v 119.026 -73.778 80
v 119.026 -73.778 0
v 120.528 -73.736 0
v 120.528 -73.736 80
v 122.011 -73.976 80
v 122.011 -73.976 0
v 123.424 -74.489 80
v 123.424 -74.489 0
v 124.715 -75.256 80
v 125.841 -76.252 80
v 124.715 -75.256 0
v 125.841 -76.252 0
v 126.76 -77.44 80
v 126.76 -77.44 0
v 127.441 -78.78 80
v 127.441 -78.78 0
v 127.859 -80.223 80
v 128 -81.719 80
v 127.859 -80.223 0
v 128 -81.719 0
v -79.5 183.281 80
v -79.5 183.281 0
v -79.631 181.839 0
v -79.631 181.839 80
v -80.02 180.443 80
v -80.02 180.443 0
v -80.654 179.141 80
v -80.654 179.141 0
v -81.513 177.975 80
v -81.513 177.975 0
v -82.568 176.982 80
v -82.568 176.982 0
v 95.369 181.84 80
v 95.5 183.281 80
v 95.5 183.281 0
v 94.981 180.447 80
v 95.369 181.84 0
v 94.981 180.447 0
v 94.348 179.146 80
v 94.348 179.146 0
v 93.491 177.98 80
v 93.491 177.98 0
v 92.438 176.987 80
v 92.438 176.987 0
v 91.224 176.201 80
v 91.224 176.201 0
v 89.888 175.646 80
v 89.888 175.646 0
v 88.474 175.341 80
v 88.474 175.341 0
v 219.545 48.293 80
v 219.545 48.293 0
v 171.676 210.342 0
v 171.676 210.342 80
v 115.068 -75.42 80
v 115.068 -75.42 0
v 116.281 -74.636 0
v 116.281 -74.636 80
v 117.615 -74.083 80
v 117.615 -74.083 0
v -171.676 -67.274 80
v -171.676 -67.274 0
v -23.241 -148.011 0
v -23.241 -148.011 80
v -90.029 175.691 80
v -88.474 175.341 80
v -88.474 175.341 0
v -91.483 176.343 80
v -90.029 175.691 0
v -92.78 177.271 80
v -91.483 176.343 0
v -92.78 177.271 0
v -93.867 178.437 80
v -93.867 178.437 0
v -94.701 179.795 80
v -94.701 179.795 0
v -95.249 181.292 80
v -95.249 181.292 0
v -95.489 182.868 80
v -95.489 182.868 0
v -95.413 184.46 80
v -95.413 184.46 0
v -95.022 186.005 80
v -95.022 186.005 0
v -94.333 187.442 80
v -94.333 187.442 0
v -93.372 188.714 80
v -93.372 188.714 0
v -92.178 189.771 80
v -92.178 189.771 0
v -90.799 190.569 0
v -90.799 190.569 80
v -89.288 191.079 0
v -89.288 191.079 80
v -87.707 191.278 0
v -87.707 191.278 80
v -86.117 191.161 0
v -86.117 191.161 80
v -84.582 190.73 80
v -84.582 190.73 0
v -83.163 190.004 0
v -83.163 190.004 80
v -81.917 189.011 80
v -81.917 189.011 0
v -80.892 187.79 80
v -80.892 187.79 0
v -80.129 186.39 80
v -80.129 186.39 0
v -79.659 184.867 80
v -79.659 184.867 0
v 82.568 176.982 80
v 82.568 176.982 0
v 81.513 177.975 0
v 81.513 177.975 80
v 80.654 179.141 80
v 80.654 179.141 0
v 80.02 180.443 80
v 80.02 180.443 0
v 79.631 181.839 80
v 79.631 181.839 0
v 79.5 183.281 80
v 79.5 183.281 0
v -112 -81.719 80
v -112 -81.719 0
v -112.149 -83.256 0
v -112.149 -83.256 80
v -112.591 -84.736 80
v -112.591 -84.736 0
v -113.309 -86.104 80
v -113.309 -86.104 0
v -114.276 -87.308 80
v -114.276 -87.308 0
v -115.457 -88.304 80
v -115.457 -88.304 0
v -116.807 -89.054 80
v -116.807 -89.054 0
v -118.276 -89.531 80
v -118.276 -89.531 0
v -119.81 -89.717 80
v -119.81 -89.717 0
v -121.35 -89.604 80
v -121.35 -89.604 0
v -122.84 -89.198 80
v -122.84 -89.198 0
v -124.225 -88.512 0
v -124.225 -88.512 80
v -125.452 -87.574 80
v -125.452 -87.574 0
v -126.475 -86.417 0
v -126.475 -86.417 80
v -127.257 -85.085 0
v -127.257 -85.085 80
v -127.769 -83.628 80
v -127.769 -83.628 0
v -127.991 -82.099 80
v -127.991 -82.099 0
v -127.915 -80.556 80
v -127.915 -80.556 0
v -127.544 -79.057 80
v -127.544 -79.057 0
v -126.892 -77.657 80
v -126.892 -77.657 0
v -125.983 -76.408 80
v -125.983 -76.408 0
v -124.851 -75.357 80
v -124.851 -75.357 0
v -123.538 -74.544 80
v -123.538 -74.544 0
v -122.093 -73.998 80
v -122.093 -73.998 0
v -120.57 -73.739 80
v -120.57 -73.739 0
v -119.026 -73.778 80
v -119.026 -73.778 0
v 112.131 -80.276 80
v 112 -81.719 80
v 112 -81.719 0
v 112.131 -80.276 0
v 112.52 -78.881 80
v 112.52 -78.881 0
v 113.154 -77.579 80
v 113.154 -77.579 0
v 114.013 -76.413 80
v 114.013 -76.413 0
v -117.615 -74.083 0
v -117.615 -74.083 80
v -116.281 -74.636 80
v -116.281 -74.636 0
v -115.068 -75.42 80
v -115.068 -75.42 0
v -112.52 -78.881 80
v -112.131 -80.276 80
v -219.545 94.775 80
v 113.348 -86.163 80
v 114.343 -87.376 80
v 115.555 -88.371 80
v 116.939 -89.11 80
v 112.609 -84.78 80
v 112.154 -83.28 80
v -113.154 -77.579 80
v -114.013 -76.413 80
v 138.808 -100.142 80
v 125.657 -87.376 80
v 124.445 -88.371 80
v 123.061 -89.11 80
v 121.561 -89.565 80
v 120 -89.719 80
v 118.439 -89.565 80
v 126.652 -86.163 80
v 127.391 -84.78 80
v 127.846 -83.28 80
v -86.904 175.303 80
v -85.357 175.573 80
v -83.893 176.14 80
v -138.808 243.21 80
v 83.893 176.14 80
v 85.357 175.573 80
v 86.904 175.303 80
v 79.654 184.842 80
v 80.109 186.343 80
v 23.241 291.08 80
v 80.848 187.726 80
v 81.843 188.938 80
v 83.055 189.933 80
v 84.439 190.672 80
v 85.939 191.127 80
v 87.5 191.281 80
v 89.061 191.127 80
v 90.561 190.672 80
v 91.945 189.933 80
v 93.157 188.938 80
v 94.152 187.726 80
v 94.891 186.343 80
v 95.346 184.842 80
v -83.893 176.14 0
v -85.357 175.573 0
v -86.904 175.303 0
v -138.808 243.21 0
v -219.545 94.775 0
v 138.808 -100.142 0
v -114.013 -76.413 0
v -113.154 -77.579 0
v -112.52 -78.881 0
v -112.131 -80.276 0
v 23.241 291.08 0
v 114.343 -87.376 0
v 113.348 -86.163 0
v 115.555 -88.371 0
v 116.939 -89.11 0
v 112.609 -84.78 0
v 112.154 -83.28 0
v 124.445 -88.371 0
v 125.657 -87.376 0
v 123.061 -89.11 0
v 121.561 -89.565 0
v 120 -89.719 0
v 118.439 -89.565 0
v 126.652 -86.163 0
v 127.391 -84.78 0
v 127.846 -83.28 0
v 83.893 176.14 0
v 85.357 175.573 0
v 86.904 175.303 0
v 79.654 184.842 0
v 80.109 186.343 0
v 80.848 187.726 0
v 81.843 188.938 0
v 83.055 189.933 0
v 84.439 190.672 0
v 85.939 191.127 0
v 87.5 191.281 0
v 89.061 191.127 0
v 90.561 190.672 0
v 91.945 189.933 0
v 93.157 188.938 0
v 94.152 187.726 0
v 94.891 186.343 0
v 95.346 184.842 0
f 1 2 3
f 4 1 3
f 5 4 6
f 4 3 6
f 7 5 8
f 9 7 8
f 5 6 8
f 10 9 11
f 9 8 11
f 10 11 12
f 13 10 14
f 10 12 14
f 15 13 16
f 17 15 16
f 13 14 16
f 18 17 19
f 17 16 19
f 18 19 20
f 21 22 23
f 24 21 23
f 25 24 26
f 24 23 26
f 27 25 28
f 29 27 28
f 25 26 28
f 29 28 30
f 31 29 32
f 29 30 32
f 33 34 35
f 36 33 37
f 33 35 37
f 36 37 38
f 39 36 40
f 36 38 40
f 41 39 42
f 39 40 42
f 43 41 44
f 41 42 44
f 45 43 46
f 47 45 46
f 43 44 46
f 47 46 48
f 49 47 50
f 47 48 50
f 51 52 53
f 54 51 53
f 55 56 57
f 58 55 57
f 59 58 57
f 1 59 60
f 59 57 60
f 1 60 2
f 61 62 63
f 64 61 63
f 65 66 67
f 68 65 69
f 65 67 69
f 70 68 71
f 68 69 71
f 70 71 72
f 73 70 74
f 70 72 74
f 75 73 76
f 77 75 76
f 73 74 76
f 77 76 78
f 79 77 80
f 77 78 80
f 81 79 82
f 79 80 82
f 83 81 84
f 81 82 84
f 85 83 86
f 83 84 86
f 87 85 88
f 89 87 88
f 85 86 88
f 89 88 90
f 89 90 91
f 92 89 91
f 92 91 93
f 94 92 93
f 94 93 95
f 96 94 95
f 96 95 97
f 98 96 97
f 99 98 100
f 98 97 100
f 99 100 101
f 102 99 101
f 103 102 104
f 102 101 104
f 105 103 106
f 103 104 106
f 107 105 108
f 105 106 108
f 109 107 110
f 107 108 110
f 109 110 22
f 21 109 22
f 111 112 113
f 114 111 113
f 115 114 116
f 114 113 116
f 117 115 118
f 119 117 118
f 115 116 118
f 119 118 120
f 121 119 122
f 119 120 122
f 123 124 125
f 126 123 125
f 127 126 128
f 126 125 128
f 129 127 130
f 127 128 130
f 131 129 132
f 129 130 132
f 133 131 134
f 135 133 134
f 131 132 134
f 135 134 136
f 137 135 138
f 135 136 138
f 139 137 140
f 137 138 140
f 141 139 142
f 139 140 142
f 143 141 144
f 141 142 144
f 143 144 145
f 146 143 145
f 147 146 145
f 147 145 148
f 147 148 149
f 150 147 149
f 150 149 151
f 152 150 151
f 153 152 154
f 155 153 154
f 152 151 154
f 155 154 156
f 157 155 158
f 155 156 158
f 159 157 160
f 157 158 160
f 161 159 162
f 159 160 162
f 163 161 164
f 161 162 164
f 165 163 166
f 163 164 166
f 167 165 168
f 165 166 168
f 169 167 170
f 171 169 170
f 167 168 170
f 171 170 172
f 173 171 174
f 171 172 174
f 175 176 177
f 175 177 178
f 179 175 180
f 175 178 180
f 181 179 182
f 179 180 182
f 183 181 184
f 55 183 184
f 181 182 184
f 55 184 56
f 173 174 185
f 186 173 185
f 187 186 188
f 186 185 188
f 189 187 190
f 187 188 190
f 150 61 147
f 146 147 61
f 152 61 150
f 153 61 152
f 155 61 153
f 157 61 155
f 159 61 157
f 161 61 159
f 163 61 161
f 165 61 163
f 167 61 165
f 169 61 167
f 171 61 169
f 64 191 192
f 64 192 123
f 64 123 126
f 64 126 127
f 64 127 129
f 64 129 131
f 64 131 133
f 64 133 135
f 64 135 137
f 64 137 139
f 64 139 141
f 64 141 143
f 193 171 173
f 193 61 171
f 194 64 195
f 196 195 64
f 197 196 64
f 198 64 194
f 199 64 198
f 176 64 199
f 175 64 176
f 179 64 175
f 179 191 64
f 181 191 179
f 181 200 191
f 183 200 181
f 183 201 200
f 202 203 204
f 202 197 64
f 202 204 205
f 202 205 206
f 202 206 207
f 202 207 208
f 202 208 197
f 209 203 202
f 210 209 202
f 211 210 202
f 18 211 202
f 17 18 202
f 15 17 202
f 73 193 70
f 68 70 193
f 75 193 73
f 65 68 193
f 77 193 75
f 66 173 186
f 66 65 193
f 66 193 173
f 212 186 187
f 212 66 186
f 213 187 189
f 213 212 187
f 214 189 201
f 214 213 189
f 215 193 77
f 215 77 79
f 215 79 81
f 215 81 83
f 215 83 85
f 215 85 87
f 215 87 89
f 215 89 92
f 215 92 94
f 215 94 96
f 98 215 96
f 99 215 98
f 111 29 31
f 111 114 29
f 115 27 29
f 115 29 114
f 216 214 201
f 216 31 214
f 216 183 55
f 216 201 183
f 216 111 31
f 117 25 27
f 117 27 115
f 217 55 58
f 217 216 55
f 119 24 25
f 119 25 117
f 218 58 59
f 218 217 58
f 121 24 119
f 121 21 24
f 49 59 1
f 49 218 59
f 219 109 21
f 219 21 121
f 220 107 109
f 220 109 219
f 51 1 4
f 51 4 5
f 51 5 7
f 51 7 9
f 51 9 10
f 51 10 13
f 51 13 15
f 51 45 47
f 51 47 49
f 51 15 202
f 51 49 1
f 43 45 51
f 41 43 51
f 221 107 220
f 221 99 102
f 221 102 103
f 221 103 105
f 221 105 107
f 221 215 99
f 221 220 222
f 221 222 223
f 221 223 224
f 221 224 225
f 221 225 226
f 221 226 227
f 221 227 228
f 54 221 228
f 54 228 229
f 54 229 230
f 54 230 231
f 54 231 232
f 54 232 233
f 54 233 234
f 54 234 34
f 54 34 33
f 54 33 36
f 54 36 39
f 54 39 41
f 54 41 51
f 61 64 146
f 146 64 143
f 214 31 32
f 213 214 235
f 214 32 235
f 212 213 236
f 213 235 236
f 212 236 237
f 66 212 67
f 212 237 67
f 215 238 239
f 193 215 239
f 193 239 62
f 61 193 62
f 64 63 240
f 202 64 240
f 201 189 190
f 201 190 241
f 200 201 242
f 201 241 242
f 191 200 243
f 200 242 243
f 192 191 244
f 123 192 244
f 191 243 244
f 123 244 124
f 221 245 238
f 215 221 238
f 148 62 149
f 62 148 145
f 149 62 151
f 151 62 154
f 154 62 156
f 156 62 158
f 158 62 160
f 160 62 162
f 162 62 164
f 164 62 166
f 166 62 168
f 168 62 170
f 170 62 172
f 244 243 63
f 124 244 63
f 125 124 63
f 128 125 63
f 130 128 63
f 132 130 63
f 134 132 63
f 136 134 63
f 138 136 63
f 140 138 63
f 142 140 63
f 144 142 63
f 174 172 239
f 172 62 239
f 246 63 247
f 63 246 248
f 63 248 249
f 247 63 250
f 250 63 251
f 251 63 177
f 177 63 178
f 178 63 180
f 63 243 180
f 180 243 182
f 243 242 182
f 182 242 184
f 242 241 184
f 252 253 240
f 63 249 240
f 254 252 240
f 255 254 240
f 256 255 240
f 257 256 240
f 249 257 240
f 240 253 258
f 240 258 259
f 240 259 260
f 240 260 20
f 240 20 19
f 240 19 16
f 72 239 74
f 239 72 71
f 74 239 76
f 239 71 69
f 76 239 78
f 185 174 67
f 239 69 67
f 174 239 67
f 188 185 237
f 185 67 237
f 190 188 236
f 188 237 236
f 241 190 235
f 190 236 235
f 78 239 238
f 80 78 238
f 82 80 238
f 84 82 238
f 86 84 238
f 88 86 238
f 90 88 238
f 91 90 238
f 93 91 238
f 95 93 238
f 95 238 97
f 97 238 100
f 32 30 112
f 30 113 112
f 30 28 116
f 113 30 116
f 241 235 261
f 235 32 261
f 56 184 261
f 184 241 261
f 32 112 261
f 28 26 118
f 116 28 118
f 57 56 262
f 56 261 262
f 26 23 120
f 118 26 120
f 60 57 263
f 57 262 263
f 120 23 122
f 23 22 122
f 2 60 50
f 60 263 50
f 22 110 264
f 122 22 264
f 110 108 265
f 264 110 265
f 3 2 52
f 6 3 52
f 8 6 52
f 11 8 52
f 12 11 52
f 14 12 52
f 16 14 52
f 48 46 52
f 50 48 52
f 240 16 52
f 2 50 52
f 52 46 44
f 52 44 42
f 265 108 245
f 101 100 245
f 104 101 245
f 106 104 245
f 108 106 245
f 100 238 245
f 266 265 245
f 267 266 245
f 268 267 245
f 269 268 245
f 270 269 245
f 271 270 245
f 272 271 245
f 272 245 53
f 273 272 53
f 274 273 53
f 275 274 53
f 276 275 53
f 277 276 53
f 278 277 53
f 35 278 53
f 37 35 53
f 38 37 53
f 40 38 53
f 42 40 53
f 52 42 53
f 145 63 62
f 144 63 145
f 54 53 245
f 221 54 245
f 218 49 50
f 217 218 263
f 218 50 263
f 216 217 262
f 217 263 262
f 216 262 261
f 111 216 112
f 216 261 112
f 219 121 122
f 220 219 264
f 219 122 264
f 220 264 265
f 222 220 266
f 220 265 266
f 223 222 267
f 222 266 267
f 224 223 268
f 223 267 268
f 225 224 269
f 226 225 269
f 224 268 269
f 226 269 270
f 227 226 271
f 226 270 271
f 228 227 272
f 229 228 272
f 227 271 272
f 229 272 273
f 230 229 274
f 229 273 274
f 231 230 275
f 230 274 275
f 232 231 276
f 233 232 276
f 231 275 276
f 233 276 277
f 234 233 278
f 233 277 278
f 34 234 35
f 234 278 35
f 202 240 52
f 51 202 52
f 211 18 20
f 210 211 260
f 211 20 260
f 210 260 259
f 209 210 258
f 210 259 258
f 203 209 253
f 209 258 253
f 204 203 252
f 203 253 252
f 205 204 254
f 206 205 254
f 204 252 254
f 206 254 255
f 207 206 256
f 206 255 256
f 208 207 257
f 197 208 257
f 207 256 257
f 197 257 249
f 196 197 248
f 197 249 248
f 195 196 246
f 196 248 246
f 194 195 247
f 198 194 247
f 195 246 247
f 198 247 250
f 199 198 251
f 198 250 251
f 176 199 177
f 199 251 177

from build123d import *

# Parameters (mm, degrees)
F1_DEPTH = 80


with BuildPart() as f1:
    # F0 (on Top) → F1 (new body)
    with BuildSketch(Plane.XY):
        Polygon((-138.8081118726, 243.2102153142), (-219.5454731322, 94.7753002802), (-171.6760737886, -67.273970347), (-23.2411587546, -148.0113316066), (138.8081118726, -100.141932263), (219.5454731322, 48.292982771), (171.6760737886, 210.3422533982), (23.2411587546, 291.0796146578), align=None)
        with BuildLine():
            Line((-79.5, 183.2811294774), (0, 183.2811294774))
            Line((0, 183.2811294774), (79.5, 183.2811294774))
            ThreePointArc((79.5, 183.2811294774), (87.5, 191.2811294774), (95.5, 183.2811294774))
            ThreePointArc((95.5, 183.2811294774), (93.4912722212, 177.9797469057), (88.473835707, 175.3406229435))
            Line((88.473835707, 175.3406229435), (119.026164293, -73.7783639886))
            ThreePointArc((119.026164293, -73.7783639886), (125.3013825717, -75.7275983014), (128, -81.7188705226))
            ThreePointArc((128, -81.7188705226), (120, -89.7188705226), (112, -81.7188705226))
            Line((112, -81.7188705226), (0, -81.7188705226))
            Line((0, -81.7188705226), (-112, -81.7188705226))
            ThreePointArc((-112, -81.7188705226), (-125.9912722212, -87.0202530943), (-119.026164293, -73.7783639886))
            Line((-119.026164293, -73.7783639886), (-88.473835707, 175.3406229435))
            ThreePointArc((-88.473835707, 175.3406229435), (-92.8013825717, 189.2724016986), (-79.5, 183.2811294774))
        make_face(mode=Mode.SUBTRACT)
        with BuildLine():
            Line((82.567931818, 176.9823436064), (0, 71.5341415256))
            Line((0, 71.5341415256), (115.067931818, -75.4200846516))
            ThreePointArc((115.067931818, -75.4200846516), (116.9350796307, -74.3292654499), (119.026164293, -73.7783639886))
            Line((119.026164293, -73.7783639886), (88.473835707, 175.3406229435))
            ThreePointArc((88.473835707, 175.3406229435), (85.3574051327, 175.5733874452), (82.567931818, 176.9823436064))
        make_face()
        with BuildLine():
            Line((115.067931818, -75.4200846516), (0, 71.5341415256))
            Line((0, 71.5341415256), (0, -81.7188705226))
            Line((0, -81.7188705226), (112, -81.7188705226))
            ThreePointArc((112, -81.7188705226), (112.8077630234, -78.2157680017), (115.067931818, -75.4200846516))
        make_face()
        with BuildLine():
            Line((0, -81.7188705226), (0, 71.5341415256))
            Line((0, 71.5341415256), (-115.067931818, -75.4200846516))
            ThreePointArc((-115.067931818, -75.4200846516), (-112.8077630234, -78.2157680017), (-112, -81.7188705226))
            Line((-112, -81.7188705226), (0, -81.7188705226))
        make_face()
        with BuildLine():
            Line((-115.067931818, -75.4200846516), (0, 71.5341415256))
            Line((0, 71.5341415256), (-82.567931818, 176.9823436064))
            ThreePointArc((-82.567931818, 176.9823436064), (-85.3574051327, 175.5733874452), (-88.473835707, 175.3406229435))
            Line((-88.473835707, 175.3406229435), (-119.026164293, -73.7783639886))
            ThreePointArc((-119.026164293, -73.7783639886), (-116.9350796307, -74.3292654499), (-115.067931818, -75.4200846516))
        make_face()
        with BuildLine():
            Line((79.5, 183.2811294774), (0, 183.2811294774))
            Line((0, 183.2811294774), (0, 71.5341415256))
            Line((0, 71.5341415256), (82.567931818, 176.9823436064))
            ThreePointArc((82.567931818, 176.9823436064), (80.3077630234, 179.7780269565), (79.5, 183.2811294774))
        make_face()
        with BuildLine():
            Line((0, 71.5341415256), (0, 183.2811294774))
            Line((0, 183.2811294774), (-79.5, 183.2811294774))
            ThreePointArc((-79.5, 183.2811294774), (-80.3077630234, 179.7780269565), (-82.567931818, 176.9823436064))
            Line((-82.567931818, 176.9823436064), (0, 71.5341415256))
        make_face()
    extrude(amount=F1_DEPTH)


solid = f1.part
